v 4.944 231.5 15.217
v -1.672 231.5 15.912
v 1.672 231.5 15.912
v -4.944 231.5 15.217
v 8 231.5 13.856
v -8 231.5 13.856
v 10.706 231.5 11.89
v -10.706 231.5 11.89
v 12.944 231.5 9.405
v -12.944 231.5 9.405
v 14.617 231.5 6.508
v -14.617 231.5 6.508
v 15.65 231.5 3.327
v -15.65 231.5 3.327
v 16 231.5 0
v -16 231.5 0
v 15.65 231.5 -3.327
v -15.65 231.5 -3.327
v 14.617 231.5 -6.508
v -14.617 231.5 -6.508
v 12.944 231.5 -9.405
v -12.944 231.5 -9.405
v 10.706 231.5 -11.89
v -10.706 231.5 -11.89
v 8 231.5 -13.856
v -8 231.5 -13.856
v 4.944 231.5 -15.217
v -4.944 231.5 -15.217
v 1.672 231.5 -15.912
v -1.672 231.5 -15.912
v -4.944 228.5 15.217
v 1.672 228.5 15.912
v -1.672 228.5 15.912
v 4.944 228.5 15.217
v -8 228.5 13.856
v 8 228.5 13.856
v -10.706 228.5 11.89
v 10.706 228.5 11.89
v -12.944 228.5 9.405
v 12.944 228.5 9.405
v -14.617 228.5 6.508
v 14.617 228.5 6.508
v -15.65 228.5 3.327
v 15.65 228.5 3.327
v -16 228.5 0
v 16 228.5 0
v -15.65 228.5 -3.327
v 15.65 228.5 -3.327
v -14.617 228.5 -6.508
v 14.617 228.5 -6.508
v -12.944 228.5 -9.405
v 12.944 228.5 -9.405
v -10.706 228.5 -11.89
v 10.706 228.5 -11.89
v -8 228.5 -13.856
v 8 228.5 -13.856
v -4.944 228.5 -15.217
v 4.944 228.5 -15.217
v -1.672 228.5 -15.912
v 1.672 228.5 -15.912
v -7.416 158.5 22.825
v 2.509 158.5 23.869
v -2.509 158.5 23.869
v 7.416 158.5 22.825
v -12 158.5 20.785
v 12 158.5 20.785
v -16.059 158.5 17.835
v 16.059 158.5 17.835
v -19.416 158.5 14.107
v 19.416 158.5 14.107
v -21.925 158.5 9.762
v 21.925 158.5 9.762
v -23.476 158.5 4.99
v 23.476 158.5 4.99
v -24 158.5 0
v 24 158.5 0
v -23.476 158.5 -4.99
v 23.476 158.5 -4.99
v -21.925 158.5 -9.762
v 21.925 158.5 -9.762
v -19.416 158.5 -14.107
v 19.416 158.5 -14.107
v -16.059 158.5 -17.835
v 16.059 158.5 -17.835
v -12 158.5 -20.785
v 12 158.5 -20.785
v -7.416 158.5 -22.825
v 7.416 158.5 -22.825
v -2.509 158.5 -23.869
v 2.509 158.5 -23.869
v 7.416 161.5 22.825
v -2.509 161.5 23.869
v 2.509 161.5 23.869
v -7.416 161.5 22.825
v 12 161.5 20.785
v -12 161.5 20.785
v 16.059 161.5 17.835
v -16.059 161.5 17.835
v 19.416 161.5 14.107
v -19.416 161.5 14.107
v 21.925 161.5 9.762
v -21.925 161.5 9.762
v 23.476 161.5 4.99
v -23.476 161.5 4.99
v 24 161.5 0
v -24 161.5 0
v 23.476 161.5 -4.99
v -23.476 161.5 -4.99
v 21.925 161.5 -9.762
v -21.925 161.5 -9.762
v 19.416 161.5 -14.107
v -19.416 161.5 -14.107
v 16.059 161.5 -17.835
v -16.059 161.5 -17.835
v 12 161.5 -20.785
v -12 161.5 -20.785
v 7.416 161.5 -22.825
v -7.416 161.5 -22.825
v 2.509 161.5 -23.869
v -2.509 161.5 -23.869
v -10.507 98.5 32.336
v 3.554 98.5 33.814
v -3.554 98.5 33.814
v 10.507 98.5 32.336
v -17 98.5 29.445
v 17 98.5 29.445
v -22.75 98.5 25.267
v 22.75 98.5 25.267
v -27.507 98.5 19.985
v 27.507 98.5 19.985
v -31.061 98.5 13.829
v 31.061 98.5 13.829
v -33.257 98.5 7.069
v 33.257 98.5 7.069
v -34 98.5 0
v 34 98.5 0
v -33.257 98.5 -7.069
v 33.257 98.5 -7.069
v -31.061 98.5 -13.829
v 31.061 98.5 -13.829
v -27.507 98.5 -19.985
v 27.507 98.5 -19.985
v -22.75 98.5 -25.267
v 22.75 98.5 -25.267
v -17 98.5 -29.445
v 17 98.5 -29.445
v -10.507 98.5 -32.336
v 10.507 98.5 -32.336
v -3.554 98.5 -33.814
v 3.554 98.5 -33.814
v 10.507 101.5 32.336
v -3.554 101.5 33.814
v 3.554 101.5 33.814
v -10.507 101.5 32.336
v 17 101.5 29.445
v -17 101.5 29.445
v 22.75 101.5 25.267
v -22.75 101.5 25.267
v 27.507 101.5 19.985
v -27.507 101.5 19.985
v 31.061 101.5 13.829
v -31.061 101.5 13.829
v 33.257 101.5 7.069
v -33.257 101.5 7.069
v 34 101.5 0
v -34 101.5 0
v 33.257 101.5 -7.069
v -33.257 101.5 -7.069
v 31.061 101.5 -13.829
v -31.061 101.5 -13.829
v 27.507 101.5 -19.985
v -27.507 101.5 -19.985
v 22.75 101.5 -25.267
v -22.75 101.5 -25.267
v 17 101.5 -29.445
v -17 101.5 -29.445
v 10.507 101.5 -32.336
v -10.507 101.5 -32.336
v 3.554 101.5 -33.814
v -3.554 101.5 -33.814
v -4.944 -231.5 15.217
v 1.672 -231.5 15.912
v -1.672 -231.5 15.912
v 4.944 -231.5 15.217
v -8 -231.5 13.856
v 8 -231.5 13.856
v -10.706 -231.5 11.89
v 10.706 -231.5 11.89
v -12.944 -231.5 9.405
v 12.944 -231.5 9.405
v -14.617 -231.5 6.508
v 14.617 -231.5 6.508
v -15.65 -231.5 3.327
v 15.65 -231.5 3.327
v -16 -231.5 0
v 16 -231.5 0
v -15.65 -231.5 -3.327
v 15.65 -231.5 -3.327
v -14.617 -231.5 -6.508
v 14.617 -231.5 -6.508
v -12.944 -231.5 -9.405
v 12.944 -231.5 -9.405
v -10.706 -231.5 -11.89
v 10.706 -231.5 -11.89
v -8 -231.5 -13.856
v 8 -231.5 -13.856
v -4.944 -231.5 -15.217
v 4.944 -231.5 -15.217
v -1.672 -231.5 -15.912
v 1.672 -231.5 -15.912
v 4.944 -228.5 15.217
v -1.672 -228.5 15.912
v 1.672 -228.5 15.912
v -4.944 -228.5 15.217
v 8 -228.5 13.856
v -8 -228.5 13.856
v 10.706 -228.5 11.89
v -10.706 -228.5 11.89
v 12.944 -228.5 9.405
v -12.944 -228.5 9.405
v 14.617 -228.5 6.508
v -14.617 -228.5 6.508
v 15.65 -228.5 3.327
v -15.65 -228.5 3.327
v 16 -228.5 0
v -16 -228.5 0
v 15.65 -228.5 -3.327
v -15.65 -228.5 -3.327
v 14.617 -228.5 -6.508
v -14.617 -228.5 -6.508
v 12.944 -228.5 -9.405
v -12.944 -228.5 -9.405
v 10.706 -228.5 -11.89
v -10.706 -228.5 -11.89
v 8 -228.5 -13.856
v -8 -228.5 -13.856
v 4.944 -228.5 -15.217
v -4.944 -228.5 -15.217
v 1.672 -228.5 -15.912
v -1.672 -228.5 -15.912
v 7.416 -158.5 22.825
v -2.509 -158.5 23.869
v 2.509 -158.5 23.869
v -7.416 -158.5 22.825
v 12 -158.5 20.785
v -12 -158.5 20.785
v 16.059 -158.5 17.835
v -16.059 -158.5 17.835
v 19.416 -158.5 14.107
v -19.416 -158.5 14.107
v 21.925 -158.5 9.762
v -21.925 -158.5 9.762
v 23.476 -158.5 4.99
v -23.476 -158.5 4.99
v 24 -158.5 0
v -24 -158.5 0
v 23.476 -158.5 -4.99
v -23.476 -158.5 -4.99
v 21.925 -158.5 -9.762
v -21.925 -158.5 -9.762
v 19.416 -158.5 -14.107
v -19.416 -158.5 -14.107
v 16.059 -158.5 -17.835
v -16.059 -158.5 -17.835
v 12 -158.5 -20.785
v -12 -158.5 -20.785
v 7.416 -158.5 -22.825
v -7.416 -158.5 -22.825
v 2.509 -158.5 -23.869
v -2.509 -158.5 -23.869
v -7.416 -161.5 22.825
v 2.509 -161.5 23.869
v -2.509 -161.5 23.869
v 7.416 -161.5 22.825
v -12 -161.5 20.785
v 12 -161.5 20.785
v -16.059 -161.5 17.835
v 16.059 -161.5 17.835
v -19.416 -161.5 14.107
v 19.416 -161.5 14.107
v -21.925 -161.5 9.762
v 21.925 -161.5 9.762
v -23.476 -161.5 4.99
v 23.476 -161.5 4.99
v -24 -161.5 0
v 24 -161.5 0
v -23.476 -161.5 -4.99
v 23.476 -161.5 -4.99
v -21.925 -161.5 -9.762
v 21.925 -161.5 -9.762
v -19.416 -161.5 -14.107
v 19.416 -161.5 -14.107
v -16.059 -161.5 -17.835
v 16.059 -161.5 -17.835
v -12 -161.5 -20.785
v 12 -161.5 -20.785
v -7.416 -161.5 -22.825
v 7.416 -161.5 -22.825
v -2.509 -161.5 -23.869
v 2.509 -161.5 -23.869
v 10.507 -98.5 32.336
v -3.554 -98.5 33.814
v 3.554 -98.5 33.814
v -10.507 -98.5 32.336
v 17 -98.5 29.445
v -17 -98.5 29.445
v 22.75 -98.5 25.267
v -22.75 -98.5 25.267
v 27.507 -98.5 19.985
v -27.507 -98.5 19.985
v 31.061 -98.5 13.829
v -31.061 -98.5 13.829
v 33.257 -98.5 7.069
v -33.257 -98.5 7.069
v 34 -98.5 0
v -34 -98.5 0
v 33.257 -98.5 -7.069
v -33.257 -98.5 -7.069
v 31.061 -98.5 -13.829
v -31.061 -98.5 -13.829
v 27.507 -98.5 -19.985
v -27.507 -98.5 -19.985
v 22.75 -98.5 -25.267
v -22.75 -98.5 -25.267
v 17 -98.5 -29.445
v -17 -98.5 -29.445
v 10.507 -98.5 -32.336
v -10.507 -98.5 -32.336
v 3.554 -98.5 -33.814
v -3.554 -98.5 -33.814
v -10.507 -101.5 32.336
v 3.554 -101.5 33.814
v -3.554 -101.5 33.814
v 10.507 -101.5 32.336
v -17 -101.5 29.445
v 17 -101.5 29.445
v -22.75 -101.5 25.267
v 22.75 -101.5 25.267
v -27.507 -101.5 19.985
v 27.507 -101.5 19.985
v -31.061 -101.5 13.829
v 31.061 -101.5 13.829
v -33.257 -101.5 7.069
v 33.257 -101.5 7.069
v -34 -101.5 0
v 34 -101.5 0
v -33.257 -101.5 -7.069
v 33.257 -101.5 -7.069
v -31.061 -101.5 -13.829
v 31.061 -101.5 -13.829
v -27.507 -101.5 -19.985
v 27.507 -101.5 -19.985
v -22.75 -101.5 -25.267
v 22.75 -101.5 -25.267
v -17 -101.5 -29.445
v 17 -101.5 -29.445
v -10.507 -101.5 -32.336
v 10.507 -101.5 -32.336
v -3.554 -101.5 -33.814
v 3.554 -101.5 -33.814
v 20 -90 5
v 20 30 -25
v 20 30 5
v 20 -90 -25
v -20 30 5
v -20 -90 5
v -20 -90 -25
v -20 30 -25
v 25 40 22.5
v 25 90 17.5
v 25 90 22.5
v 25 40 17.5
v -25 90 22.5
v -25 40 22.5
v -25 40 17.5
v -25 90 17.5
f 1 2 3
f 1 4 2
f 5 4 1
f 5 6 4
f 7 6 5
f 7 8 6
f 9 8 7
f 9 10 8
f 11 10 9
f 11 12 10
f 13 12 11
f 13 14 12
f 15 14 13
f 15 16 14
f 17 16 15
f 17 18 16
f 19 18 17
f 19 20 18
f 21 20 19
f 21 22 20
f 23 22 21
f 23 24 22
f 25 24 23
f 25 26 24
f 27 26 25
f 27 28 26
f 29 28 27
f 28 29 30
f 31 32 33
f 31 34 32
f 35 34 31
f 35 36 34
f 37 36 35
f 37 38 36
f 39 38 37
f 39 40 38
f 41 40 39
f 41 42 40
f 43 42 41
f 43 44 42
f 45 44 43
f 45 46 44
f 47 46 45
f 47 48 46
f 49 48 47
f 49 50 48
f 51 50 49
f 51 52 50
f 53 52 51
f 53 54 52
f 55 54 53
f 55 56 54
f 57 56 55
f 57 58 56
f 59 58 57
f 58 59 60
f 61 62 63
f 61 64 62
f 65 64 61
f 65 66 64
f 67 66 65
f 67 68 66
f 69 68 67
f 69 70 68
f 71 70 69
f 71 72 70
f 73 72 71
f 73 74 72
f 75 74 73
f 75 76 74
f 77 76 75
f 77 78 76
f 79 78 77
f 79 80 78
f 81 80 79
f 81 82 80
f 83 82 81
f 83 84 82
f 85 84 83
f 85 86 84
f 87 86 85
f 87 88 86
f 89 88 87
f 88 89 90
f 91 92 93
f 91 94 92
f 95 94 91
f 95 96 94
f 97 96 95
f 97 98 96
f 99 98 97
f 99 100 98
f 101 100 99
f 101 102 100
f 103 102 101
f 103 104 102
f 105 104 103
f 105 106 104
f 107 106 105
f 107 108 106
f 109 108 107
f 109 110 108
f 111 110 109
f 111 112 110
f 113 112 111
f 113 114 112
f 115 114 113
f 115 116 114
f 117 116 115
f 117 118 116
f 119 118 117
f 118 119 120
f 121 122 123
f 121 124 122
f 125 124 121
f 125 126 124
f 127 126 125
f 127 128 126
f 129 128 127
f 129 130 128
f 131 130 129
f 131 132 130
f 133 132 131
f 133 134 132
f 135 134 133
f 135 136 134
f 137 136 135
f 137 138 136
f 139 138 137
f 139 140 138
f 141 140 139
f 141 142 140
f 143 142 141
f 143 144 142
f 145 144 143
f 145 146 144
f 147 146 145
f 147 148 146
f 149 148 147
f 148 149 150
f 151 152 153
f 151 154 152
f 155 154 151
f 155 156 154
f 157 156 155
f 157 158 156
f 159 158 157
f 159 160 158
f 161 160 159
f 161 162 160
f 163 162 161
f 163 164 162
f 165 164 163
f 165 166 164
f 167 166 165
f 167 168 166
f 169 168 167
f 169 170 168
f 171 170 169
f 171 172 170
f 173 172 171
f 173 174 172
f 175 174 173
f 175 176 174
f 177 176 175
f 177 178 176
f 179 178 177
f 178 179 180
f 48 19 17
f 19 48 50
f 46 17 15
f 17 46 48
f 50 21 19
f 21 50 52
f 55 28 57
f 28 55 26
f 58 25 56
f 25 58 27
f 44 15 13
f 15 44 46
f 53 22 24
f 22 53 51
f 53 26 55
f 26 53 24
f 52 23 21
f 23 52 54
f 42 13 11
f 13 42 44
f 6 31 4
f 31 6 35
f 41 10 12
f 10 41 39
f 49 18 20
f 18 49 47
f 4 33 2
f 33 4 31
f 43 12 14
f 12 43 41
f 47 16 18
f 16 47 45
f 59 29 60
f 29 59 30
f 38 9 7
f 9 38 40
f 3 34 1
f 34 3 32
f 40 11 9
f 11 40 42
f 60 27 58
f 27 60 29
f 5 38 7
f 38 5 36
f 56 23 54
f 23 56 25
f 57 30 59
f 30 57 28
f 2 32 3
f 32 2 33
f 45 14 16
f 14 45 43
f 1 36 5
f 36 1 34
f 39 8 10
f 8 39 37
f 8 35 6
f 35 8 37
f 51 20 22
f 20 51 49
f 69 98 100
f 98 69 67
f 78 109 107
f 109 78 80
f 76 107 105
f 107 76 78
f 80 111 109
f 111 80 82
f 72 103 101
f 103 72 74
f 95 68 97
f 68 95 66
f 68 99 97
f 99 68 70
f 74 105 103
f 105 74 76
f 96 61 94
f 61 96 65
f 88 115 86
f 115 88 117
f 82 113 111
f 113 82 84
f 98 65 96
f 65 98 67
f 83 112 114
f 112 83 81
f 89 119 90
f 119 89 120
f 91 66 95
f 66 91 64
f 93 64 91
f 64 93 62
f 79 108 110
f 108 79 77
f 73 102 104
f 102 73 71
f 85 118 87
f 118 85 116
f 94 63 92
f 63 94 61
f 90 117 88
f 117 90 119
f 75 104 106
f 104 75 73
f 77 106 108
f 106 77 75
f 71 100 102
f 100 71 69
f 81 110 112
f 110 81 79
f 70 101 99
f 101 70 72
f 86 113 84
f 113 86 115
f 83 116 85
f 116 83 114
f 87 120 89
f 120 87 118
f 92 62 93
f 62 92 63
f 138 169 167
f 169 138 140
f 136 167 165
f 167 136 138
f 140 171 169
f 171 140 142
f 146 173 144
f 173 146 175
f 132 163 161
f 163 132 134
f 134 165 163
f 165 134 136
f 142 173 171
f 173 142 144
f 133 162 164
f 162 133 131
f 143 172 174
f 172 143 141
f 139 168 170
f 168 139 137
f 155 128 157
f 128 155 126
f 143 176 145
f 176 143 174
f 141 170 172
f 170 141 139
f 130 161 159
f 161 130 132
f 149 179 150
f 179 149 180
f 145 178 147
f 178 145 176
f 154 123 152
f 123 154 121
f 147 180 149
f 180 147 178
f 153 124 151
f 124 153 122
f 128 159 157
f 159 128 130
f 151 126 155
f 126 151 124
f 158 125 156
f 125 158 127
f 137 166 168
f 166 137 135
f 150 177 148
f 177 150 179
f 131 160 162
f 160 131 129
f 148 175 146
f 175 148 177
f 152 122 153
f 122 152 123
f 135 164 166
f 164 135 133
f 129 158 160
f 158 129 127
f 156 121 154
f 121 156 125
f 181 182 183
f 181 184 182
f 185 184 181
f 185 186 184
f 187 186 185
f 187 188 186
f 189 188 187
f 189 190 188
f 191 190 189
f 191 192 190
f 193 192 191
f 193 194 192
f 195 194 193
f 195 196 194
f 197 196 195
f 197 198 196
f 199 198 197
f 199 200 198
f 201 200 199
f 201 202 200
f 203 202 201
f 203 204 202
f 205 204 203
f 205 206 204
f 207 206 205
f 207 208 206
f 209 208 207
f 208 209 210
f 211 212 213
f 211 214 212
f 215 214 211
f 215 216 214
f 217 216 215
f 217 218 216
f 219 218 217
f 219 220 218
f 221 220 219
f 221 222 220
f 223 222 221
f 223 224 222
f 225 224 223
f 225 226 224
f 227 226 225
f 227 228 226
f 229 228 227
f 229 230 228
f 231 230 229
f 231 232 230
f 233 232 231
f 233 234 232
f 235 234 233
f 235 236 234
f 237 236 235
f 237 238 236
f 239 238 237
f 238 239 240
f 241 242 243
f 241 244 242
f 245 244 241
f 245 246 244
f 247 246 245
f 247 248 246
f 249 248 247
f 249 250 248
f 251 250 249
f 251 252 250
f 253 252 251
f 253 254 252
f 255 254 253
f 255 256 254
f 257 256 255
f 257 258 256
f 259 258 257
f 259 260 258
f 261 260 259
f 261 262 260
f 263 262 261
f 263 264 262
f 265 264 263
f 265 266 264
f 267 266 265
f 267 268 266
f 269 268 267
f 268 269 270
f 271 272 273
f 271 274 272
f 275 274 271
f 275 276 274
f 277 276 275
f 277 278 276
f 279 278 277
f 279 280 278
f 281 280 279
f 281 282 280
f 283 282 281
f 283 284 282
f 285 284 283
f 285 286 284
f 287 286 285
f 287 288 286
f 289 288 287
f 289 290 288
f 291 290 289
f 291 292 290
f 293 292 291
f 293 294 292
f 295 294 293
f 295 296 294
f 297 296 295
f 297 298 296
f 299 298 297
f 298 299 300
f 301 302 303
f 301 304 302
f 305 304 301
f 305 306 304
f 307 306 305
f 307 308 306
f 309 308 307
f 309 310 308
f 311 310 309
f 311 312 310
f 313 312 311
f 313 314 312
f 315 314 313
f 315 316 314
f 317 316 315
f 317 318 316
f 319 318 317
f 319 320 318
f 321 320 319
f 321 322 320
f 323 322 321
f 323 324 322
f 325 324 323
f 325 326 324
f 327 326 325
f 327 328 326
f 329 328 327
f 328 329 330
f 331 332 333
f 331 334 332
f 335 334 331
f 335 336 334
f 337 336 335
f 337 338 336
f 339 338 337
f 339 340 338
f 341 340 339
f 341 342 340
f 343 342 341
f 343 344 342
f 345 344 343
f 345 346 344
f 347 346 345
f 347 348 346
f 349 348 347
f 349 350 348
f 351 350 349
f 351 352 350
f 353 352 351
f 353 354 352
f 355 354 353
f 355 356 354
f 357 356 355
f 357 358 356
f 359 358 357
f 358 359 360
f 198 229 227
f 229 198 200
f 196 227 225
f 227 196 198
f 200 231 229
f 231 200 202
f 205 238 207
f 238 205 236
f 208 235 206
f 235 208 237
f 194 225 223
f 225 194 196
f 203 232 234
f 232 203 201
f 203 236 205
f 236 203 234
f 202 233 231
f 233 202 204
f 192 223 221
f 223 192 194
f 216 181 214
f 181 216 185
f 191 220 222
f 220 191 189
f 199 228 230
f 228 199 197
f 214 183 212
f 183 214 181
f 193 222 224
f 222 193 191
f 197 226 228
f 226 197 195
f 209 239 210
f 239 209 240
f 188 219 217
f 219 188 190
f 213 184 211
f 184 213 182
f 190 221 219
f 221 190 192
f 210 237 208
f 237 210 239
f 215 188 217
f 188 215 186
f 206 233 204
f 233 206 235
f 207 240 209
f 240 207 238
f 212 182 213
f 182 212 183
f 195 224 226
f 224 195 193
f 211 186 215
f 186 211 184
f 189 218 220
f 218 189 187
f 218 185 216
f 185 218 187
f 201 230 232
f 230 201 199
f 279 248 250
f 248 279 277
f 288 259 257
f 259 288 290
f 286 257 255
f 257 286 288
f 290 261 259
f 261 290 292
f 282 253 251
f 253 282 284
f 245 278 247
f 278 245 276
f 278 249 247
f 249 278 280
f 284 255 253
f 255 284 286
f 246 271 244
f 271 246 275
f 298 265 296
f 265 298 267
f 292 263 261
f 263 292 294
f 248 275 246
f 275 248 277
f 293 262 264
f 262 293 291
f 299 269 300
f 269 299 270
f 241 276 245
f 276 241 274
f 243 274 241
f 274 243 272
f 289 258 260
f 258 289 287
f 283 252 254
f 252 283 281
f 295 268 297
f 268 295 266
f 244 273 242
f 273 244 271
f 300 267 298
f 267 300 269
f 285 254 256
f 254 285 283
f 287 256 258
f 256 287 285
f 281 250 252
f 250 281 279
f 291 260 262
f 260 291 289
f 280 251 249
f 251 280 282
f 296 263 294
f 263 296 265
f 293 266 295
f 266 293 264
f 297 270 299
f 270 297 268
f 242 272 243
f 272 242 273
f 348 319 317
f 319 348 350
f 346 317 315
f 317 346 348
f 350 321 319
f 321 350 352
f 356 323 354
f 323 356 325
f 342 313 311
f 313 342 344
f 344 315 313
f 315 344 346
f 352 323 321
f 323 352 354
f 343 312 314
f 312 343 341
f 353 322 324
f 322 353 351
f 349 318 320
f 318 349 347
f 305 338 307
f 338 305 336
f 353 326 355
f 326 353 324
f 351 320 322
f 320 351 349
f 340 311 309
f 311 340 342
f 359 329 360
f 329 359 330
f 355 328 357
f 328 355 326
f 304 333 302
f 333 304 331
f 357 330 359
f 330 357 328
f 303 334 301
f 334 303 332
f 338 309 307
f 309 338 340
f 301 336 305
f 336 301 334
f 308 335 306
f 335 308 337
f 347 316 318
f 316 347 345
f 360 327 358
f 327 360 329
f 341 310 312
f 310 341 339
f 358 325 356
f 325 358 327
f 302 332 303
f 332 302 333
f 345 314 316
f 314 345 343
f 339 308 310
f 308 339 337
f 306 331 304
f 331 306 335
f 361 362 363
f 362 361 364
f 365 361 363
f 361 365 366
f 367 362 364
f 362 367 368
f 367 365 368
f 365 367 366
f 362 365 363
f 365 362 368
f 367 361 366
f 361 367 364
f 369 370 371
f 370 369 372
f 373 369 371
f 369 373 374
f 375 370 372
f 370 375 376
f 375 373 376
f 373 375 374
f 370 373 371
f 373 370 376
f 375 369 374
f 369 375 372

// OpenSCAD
ep=3;
nb=15;
h=480;
kerf=0.1;
logo_ep=5;

// bagues: [numéro, hauteur, diamètre int, diamètre ext]
bagues_spec=[
    [0,h/2-10,8,16],
    [1,160,16,24],
    [2,100,26,34]
];

module pales(ep){
    rotate([0,5,0]){
    translate([0,-h/2,0]){
        for (i=[0:nb]){
            rotate([0,i*(360/nb),0]) translate([9,0,0]) linear_extrude(height = ep, center = true) import(file = "torche_contour.dxf");
        }
    }
}
}

module pales_cutter(ep){
    difference(){
        children();
        pales(ep-kerf);    
    }
}

module bague(r,ep){
   rotate([-90,0,0]) cylinder(h=ep,r=r,center=true);
}

module mirrorer(v){
    children();
    mirror(v) children();
}


module bagues(ep,seulementInterieur){
    mirrorer([0,1,0]){
        for (s=bagues_spec){
            translate([0,s[1],0]) bague(s[2],ep);
        }
    if (seulementInterieur==false){
        for (s=bagues_spec){
            translate([0,s[1],0]) bague(s[3],ep);
        }
        }
    }
}

module bagues_cutter(ep){
    difference(){
        children();
        bagues(ep-kerf,seulementInterieur=true);    
    }
}


module trouBoite(){
    difference(){
        children();
    for (i=[1:4]){
        translate([0,0,i*10]) boite();
    }
}
}
module trouLogo(){
    difference(){
        children();
    for (i=[1:10]){
        translate([0,0,i*(logo_ep-1)]) logo();
    }
}
    }
module boite(){
    translate([0,-30,-10]) cube([40,120,30],center=true);    
}

module logo(){
    translate([0,65,20]) cube([50,50,logo_ep],center=true);
}


module torche(ep){
    bagues_cutter(ep){
        pales(ep);
    }
}

module torche_cutter(ep){
    difference(){
        children();
        bagues_cutter(ep+kerf){ pales(ep-kerf);}
    }
}

module torche2(){
    trouLogo() trouBoite() torche(ep);
}

// ce module permet d'applatir les coupes en angle afin de récupérer uniquement la plus petite dimension.
module flatteninter(){
    children();
//    intersection(){
//        translate([0,0,ep/2-0.2]) children();
//        translate([0,0,-ep/2+0.2]) children();
//    }
}

module torche2D(){     
    for (i=[0:nb/2-1]){
        //for (i=[0:1]){
         projection(true) translate([(i+1)*120,0,0]) flatteninter() rotate([0,i*(360/nb),0]) torche2();
        }
}


module bagues2D(){
    mirror([1,0,0]){
    for (s=bagues_spec){
        translate([s[0]*50,0,0]){
         projection(true) color("green") rotate([90,0,0]) translate([0,-s[1],0]) torche_cutter(ep) bagues(ep,seulementInterieur=false);
        }
    }
}
}

module plan2D(){
    torche2D();       
    bagues2D();
}

module plan3D(){
    torche2(ep);
    color("green") bagues(ep,seulementInterieur=false);
    color("blue") boite();
    color("red") logo();
}

//plan2D();
plan3D();
